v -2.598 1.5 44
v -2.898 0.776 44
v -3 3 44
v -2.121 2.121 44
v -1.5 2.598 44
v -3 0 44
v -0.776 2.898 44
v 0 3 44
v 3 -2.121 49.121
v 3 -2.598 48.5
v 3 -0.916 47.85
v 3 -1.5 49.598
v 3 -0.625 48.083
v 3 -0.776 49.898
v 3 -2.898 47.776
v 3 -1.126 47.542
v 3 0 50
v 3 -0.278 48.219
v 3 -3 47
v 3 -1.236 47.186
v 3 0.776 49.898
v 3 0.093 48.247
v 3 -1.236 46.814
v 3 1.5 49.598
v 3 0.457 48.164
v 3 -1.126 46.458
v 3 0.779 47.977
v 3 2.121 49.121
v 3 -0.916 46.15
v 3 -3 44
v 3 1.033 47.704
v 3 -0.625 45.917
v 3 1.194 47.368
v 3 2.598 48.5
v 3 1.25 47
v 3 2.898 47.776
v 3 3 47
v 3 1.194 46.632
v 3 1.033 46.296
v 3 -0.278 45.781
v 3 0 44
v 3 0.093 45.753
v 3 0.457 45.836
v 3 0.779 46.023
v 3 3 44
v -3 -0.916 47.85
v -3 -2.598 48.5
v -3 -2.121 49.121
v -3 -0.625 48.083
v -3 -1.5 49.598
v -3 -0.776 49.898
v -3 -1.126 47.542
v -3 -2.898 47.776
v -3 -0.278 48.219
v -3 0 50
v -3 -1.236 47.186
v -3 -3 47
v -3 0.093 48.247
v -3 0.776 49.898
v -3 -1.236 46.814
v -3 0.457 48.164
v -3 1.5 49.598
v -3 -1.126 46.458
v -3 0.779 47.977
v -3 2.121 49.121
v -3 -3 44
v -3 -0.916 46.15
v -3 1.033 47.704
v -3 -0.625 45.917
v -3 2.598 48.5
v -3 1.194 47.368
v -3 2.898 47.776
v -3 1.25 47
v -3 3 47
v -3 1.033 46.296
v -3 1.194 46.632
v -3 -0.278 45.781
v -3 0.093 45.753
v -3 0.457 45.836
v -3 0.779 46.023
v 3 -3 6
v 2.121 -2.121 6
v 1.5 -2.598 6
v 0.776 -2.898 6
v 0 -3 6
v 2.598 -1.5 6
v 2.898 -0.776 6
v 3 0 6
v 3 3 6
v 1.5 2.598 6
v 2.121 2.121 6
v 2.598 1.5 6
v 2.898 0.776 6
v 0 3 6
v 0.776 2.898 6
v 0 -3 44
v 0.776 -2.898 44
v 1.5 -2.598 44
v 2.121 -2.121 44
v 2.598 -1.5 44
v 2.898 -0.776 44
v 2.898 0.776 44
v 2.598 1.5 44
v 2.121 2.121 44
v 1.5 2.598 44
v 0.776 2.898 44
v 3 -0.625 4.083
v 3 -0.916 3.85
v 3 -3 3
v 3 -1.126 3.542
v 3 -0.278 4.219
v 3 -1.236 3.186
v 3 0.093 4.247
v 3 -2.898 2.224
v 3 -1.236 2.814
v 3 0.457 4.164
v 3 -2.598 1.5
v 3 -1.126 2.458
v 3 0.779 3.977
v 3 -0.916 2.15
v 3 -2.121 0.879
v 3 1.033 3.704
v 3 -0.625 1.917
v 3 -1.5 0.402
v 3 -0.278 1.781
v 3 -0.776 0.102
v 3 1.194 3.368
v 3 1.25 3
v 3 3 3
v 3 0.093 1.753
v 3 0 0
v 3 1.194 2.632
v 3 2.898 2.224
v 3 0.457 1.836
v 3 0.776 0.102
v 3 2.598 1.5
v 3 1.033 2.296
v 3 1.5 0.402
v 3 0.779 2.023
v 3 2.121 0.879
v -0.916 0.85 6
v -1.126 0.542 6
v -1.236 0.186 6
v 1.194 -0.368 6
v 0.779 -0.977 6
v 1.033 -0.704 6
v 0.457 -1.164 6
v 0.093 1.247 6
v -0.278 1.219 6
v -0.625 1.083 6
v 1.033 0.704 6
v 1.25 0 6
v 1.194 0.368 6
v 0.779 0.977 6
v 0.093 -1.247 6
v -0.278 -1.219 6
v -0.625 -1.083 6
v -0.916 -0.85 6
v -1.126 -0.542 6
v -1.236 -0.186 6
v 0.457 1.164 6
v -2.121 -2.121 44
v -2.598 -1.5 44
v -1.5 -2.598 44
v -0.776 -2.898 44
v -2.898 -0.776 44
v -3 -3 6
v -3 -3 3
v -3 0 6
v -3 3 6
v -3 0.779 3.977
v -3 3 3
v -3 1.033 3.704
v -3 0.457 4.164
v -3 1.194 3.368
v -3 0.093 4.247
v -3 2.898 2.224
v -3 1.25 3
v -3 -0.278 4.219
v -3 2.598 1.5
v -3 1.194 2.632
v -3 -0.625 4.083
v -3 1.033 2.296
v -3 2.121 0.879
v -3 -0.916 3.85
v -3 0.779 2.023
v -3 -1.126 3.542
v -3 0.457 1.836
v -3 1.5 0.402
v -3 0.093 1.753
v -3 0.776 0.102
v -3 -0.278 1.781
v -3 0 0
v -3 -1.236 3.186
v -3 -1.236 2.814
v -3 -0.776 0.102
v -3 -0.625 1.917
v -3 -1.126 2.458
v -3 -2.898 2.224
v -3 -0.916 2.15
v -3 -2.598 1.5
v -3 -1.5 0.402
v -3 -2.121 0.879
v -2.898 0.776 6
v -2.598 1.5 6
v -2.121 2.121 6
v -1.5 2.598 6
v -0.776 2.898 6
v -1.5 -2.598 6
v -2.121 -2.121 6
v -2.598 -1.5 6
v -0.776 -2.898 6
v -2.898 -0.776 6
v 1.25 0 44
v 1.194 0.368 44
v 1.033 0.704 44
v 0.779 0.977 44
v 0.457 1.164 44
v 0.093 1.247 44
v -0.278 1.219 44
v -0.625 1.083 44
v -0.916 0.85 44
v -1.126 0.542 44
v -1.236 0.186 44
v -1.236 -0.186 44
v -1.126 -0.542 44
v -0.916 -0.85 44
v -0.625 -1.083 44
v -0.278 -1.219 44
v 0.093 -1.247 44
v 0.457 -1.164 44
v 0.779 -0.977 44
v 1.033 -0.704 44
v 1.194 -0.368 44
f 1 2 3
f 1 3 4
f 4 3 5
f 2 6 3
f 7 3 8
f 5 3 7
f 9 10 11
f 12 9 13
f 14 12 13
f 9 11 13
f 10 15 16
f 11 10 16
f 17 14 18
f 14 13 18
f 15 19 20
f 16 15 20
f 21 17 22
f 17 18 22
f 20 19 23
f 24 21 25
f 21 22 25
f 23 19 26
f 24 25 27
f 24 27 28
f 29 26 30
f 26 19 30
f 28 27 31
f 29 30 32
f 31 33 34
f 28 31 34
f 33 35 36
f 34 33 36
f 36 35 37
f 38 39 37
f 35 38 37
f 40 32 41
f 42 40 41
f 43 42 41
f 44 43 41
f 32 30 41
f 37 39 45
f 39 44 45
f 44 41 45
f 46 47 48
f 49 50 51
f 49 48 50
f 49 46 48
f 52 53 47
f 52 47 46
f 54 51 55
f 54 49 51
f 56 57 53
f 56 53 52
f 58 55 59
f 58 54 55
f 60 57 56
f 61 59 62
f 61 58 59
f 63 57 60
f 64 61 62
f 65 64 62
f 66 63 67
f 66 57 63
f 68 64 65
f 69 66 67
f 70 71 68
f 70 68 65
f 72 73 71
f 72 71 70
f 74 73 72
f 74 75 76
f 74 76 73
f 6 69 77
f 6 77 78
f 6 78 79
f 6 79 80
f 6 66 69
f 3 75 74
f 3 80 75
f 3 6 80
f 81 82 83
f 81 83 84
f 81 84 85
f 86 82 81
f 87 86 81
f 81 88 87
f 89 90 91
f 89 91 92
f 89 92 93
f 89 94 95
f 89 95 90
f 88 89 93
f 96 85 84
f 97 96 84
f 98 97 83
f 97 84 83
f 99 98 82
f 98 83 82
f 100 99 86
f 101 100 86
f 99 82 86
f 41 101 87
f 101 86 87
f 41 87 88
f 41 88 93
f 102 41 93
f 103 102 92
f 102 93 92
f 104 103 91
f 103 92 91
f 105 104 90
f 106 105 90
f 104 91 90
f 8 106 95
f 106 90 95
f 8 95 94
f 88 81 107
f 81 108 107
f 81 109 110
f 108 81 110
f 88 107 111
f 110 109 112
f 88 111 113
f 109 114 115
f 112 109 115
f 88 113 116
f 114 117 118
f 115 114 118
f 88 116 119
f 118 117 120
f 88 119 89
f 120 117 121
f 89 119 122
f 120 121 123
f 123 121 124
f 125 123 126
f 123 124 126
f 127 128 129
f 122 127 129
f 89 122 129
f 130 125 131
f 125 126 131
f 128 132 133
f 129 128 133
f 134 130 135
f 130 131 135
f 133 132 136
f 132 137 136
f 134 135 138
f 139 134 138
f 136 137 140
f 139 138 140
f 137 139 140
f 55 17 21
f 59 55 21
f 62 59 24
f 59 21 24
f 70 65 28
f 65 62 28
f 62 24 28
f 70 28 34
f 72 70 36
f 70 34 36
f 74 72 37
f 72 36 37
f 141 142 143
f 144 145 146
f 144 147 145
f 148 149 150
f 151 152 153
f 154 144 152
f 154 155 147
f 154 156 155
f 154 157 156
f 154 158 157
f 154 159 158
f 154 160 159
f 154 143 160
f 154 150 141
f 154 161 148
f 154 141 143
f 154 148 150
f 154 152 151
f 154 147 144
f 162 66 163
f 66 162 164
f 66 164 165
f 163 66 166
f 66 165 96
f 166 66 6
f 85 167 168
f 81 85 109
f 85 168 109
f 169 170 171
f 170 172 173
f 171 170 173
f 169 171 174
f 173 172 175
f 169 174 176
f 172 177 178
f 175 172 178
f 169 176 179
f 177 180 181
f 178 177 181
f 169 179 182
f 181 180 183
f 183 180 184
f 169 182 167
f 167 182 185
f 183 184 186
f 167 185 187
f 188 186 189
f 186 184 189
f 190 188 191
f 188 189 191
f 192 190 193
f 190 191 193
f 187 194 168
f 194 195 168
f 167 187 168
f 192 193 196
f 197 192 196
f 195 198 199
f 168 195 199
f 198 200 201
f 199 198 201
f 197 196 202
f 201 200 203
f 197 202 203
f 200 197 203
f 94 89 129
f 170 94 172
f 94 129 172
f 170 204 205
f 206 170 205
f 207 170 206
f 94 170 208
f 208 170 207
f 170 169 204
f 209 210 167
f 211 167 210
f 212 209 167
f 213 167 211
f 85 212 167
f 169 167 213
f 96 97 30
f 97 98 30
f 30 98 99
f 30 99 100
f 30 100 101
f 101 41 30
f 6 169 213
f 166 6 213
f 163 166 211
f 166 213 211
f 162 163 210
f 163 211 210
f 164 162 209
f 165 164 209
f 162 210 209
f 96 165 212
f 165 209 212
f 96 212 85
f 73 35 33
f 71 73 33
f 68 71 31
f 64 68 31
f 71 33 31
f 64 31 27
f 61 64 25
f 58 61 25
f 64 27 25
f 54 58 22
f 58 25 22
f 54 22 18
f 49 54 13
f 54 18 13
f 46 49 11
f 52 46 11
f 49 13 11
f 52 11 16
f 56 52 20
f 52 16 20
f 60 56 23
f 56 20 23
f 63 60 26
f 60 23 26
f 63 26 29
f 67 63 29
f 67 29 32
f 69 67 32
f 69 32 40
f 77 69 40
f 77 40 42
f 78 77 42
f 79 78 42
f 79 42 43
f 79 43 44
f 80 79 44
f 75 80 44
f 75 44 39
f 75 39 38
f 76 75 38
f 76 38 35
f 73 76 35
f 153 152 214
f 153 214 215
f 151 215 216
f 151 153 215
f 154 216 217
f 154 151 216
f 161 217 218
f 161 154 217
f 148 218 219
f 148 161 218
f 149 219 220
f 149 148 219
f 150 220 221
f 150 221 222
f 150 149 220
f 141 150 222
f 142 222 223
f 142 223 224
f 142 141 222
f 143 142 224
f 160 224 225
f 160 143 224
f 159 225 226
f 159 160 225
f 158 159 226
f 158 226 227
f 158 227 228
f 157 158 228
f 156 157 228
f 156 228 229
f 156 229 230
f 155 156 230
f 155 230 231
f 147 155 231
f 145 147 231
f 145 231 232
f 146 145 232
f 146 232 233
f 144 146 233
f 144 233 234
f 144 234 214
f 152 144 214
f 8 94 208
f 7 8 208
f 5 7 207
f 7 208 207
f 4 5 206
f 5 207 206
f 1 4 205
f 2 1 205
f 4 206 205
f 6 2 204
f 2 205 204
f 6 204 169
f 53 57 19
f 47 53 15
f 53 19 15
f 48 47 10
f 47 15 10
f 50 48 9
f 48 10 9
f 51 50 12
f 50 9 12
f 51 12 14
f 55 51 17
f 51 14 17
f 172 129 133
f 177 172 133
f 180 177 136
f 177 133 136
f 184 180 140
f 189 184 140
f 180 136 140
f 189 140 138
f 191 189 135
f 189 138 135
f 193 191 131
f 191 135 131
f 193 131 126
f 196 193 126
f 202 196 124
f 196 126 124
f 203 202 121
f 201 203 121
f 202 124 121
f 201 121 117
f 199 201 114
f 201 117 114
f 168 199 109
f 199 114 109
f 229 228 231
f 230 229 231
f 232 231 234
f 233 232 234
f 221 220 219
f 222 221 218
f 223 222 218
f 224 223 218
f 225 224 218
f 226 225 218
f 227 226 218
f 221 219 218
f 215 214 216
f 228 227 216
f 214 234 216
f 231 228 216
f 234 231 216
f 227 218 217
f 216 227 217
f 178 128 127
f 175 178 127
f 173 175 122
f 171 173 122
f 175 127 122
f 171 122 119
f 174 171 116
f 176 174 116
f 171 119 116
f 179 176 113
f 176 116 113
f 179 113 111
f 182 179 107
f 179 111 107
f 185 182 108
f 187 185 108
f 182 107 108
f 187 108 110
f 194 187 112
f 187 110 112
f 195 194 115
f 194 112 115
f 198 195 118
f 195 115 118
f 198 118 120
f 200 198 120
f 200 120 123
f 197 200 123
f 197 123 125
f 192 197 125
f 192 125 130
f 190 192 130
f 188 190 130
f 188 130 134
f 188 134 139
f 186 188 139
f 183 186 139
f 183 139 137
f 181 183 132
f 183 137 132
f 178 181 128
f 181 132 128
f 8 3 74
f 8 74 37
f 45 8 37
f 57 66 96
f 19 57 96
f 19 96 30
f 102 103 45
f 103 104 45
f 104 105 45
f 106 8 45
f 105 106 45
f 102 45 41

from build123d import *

# Parameters (mm, degrees)
F0_R     = 1.25
F1_DEPTH = 6
F2_DEPTH = 44
F3_R     = 1.25
F4_DEPTH = 6
F5_W     = 6
F5_H     = 6
F6_DEPTH = 6
F7_R     = 1.25
F8_DEPTH = 25


# Not quite as in the source:
# - a feature names something its author has since deleted; it is built from what else it names


with BuildPart() as f1:
    # F0 (on Top) → F1 (new body)
    with BuildSketch(Plane.XY):
        with BuildLine():
            ThreePointArc((0, -3), (2.1213203436, -2.1213203436), (3, 0))
            ThreePointArc((3, 0), (2.1213203436, 2.1213203436), (0, 3))
            ThreePointArc((0, 3), (-2.1213203436, 2.1213203436), (-3, 0))
            ThreePointArc((-3, 0), (-2.1213203436, -2.1213203436), (0, -3))
        make_face()
        Circle(F0_R, mode=Mode.SUBTRACT)
        with BuildLine():
            ThreePointArc((-3, 0), (-2.1213203436, 2.1213203436), (0, 3))
            Line((0, 3), (-3, 3))
            Line((-3, 3), (-3, 0))
        make_face()
        with BuildLine():
            Line((-3, -3), (0, -3))
            ThreePointArc((0, -3), (-2.1213203436, -2.1213203436), (-3, 0))
            Line((-3, 0), (-3, -3))
        make_face()
        with BuildLine():
            Line((3, -3), (3, 0))
            ThreePointArc((3, 0), (2.1213203436, -2.1213203436), (0, -3))
            Line((0, -3), (3, -3))
        make_face()
        with BuildLine():
            ThreePointArc((0, 3), (2.1213203436, 2.1213203436), (3, 0))
            Line((3, 0), (3, 3))
            Line((3, 3), (0, 3))
        make_face()
        Circle(F0_R)
    extrude(amount=F1_DEPTH)

    # F0 (on Top) → F2 (join)
    with BuildSketch(Plane.XY):
        with BuildLine():
            ThreePointArc((0, -3), (2.1213203436, -2.1213203436), (3, 0))
            ThreePointArc((3, 0), (2.1213203436, 2.1213203436), (0, 3))
            ThreePointArc((0, 3), (-2.1213203436, 2.1213203436), (-3, 0))
            ThreePointArc((-3, 0), (-2.1213203436, -2.1213203436), (0, -3))
        make_face()
        Circle(F0_R, mode=Mode.SUBTRACT)
    extrude(amount=F2_DEPTH)

    # F3 (on face) → F4 (cut)
    with BuildSketch(Plane.YZ.offset(3)):
        with Locations((0, 3)):
            Circle(F3_R)
        with BuildLine():
            Line((-3, 0), (0, 0))
            ThreePointArc((0, 0), (-2.1213203436, 0.8786796564), (-3, 3))
            Line((-3, 3), (-3, 0))
        make_face()
        with BuildLine():
            Line((3, 0), (3, 3))
            ThreePointArc((3, 3), (2.1213203436, 0.8786796564), (0, 0))
            Line((0, 0), (3, 0))
        make_face()
    extrude(amount=-F4_DEPTH, mode=Mode.SUBTRACT)

    # F5 (on face) → F6 (join)
    with BuildSketch(Plane.XY.offset(44)):
        Rectangle(F5_W, F5_H)
    extrude(amount=F6_DEPTH)

    # F7 (on face) → F8 (cut)
    with BuildSketch(Plane.YZ.offset(3)):
        with Locations((0, 47)):
            Circle(F7_R)
        with BuildLine():
            Line((-3, 50), (-3, 47))
            ThreePointArc((-3, 47), (-2.1213203436, 49.1213203436), (0, 50))
            Line((0, 50), (-3, 50))
        make_face()
        with BuildLine():
            ThreePointArc((0, 50), (2.1213203436, 49.1213203436), (3, 47))
            Line((3, 47), (3, 50))
            Line((3, 50), (0, 50))
        make_face()
    extrude(amount=-F8_DEPTH, mode=Mode.SUBTRACT)


solid = f1.part
